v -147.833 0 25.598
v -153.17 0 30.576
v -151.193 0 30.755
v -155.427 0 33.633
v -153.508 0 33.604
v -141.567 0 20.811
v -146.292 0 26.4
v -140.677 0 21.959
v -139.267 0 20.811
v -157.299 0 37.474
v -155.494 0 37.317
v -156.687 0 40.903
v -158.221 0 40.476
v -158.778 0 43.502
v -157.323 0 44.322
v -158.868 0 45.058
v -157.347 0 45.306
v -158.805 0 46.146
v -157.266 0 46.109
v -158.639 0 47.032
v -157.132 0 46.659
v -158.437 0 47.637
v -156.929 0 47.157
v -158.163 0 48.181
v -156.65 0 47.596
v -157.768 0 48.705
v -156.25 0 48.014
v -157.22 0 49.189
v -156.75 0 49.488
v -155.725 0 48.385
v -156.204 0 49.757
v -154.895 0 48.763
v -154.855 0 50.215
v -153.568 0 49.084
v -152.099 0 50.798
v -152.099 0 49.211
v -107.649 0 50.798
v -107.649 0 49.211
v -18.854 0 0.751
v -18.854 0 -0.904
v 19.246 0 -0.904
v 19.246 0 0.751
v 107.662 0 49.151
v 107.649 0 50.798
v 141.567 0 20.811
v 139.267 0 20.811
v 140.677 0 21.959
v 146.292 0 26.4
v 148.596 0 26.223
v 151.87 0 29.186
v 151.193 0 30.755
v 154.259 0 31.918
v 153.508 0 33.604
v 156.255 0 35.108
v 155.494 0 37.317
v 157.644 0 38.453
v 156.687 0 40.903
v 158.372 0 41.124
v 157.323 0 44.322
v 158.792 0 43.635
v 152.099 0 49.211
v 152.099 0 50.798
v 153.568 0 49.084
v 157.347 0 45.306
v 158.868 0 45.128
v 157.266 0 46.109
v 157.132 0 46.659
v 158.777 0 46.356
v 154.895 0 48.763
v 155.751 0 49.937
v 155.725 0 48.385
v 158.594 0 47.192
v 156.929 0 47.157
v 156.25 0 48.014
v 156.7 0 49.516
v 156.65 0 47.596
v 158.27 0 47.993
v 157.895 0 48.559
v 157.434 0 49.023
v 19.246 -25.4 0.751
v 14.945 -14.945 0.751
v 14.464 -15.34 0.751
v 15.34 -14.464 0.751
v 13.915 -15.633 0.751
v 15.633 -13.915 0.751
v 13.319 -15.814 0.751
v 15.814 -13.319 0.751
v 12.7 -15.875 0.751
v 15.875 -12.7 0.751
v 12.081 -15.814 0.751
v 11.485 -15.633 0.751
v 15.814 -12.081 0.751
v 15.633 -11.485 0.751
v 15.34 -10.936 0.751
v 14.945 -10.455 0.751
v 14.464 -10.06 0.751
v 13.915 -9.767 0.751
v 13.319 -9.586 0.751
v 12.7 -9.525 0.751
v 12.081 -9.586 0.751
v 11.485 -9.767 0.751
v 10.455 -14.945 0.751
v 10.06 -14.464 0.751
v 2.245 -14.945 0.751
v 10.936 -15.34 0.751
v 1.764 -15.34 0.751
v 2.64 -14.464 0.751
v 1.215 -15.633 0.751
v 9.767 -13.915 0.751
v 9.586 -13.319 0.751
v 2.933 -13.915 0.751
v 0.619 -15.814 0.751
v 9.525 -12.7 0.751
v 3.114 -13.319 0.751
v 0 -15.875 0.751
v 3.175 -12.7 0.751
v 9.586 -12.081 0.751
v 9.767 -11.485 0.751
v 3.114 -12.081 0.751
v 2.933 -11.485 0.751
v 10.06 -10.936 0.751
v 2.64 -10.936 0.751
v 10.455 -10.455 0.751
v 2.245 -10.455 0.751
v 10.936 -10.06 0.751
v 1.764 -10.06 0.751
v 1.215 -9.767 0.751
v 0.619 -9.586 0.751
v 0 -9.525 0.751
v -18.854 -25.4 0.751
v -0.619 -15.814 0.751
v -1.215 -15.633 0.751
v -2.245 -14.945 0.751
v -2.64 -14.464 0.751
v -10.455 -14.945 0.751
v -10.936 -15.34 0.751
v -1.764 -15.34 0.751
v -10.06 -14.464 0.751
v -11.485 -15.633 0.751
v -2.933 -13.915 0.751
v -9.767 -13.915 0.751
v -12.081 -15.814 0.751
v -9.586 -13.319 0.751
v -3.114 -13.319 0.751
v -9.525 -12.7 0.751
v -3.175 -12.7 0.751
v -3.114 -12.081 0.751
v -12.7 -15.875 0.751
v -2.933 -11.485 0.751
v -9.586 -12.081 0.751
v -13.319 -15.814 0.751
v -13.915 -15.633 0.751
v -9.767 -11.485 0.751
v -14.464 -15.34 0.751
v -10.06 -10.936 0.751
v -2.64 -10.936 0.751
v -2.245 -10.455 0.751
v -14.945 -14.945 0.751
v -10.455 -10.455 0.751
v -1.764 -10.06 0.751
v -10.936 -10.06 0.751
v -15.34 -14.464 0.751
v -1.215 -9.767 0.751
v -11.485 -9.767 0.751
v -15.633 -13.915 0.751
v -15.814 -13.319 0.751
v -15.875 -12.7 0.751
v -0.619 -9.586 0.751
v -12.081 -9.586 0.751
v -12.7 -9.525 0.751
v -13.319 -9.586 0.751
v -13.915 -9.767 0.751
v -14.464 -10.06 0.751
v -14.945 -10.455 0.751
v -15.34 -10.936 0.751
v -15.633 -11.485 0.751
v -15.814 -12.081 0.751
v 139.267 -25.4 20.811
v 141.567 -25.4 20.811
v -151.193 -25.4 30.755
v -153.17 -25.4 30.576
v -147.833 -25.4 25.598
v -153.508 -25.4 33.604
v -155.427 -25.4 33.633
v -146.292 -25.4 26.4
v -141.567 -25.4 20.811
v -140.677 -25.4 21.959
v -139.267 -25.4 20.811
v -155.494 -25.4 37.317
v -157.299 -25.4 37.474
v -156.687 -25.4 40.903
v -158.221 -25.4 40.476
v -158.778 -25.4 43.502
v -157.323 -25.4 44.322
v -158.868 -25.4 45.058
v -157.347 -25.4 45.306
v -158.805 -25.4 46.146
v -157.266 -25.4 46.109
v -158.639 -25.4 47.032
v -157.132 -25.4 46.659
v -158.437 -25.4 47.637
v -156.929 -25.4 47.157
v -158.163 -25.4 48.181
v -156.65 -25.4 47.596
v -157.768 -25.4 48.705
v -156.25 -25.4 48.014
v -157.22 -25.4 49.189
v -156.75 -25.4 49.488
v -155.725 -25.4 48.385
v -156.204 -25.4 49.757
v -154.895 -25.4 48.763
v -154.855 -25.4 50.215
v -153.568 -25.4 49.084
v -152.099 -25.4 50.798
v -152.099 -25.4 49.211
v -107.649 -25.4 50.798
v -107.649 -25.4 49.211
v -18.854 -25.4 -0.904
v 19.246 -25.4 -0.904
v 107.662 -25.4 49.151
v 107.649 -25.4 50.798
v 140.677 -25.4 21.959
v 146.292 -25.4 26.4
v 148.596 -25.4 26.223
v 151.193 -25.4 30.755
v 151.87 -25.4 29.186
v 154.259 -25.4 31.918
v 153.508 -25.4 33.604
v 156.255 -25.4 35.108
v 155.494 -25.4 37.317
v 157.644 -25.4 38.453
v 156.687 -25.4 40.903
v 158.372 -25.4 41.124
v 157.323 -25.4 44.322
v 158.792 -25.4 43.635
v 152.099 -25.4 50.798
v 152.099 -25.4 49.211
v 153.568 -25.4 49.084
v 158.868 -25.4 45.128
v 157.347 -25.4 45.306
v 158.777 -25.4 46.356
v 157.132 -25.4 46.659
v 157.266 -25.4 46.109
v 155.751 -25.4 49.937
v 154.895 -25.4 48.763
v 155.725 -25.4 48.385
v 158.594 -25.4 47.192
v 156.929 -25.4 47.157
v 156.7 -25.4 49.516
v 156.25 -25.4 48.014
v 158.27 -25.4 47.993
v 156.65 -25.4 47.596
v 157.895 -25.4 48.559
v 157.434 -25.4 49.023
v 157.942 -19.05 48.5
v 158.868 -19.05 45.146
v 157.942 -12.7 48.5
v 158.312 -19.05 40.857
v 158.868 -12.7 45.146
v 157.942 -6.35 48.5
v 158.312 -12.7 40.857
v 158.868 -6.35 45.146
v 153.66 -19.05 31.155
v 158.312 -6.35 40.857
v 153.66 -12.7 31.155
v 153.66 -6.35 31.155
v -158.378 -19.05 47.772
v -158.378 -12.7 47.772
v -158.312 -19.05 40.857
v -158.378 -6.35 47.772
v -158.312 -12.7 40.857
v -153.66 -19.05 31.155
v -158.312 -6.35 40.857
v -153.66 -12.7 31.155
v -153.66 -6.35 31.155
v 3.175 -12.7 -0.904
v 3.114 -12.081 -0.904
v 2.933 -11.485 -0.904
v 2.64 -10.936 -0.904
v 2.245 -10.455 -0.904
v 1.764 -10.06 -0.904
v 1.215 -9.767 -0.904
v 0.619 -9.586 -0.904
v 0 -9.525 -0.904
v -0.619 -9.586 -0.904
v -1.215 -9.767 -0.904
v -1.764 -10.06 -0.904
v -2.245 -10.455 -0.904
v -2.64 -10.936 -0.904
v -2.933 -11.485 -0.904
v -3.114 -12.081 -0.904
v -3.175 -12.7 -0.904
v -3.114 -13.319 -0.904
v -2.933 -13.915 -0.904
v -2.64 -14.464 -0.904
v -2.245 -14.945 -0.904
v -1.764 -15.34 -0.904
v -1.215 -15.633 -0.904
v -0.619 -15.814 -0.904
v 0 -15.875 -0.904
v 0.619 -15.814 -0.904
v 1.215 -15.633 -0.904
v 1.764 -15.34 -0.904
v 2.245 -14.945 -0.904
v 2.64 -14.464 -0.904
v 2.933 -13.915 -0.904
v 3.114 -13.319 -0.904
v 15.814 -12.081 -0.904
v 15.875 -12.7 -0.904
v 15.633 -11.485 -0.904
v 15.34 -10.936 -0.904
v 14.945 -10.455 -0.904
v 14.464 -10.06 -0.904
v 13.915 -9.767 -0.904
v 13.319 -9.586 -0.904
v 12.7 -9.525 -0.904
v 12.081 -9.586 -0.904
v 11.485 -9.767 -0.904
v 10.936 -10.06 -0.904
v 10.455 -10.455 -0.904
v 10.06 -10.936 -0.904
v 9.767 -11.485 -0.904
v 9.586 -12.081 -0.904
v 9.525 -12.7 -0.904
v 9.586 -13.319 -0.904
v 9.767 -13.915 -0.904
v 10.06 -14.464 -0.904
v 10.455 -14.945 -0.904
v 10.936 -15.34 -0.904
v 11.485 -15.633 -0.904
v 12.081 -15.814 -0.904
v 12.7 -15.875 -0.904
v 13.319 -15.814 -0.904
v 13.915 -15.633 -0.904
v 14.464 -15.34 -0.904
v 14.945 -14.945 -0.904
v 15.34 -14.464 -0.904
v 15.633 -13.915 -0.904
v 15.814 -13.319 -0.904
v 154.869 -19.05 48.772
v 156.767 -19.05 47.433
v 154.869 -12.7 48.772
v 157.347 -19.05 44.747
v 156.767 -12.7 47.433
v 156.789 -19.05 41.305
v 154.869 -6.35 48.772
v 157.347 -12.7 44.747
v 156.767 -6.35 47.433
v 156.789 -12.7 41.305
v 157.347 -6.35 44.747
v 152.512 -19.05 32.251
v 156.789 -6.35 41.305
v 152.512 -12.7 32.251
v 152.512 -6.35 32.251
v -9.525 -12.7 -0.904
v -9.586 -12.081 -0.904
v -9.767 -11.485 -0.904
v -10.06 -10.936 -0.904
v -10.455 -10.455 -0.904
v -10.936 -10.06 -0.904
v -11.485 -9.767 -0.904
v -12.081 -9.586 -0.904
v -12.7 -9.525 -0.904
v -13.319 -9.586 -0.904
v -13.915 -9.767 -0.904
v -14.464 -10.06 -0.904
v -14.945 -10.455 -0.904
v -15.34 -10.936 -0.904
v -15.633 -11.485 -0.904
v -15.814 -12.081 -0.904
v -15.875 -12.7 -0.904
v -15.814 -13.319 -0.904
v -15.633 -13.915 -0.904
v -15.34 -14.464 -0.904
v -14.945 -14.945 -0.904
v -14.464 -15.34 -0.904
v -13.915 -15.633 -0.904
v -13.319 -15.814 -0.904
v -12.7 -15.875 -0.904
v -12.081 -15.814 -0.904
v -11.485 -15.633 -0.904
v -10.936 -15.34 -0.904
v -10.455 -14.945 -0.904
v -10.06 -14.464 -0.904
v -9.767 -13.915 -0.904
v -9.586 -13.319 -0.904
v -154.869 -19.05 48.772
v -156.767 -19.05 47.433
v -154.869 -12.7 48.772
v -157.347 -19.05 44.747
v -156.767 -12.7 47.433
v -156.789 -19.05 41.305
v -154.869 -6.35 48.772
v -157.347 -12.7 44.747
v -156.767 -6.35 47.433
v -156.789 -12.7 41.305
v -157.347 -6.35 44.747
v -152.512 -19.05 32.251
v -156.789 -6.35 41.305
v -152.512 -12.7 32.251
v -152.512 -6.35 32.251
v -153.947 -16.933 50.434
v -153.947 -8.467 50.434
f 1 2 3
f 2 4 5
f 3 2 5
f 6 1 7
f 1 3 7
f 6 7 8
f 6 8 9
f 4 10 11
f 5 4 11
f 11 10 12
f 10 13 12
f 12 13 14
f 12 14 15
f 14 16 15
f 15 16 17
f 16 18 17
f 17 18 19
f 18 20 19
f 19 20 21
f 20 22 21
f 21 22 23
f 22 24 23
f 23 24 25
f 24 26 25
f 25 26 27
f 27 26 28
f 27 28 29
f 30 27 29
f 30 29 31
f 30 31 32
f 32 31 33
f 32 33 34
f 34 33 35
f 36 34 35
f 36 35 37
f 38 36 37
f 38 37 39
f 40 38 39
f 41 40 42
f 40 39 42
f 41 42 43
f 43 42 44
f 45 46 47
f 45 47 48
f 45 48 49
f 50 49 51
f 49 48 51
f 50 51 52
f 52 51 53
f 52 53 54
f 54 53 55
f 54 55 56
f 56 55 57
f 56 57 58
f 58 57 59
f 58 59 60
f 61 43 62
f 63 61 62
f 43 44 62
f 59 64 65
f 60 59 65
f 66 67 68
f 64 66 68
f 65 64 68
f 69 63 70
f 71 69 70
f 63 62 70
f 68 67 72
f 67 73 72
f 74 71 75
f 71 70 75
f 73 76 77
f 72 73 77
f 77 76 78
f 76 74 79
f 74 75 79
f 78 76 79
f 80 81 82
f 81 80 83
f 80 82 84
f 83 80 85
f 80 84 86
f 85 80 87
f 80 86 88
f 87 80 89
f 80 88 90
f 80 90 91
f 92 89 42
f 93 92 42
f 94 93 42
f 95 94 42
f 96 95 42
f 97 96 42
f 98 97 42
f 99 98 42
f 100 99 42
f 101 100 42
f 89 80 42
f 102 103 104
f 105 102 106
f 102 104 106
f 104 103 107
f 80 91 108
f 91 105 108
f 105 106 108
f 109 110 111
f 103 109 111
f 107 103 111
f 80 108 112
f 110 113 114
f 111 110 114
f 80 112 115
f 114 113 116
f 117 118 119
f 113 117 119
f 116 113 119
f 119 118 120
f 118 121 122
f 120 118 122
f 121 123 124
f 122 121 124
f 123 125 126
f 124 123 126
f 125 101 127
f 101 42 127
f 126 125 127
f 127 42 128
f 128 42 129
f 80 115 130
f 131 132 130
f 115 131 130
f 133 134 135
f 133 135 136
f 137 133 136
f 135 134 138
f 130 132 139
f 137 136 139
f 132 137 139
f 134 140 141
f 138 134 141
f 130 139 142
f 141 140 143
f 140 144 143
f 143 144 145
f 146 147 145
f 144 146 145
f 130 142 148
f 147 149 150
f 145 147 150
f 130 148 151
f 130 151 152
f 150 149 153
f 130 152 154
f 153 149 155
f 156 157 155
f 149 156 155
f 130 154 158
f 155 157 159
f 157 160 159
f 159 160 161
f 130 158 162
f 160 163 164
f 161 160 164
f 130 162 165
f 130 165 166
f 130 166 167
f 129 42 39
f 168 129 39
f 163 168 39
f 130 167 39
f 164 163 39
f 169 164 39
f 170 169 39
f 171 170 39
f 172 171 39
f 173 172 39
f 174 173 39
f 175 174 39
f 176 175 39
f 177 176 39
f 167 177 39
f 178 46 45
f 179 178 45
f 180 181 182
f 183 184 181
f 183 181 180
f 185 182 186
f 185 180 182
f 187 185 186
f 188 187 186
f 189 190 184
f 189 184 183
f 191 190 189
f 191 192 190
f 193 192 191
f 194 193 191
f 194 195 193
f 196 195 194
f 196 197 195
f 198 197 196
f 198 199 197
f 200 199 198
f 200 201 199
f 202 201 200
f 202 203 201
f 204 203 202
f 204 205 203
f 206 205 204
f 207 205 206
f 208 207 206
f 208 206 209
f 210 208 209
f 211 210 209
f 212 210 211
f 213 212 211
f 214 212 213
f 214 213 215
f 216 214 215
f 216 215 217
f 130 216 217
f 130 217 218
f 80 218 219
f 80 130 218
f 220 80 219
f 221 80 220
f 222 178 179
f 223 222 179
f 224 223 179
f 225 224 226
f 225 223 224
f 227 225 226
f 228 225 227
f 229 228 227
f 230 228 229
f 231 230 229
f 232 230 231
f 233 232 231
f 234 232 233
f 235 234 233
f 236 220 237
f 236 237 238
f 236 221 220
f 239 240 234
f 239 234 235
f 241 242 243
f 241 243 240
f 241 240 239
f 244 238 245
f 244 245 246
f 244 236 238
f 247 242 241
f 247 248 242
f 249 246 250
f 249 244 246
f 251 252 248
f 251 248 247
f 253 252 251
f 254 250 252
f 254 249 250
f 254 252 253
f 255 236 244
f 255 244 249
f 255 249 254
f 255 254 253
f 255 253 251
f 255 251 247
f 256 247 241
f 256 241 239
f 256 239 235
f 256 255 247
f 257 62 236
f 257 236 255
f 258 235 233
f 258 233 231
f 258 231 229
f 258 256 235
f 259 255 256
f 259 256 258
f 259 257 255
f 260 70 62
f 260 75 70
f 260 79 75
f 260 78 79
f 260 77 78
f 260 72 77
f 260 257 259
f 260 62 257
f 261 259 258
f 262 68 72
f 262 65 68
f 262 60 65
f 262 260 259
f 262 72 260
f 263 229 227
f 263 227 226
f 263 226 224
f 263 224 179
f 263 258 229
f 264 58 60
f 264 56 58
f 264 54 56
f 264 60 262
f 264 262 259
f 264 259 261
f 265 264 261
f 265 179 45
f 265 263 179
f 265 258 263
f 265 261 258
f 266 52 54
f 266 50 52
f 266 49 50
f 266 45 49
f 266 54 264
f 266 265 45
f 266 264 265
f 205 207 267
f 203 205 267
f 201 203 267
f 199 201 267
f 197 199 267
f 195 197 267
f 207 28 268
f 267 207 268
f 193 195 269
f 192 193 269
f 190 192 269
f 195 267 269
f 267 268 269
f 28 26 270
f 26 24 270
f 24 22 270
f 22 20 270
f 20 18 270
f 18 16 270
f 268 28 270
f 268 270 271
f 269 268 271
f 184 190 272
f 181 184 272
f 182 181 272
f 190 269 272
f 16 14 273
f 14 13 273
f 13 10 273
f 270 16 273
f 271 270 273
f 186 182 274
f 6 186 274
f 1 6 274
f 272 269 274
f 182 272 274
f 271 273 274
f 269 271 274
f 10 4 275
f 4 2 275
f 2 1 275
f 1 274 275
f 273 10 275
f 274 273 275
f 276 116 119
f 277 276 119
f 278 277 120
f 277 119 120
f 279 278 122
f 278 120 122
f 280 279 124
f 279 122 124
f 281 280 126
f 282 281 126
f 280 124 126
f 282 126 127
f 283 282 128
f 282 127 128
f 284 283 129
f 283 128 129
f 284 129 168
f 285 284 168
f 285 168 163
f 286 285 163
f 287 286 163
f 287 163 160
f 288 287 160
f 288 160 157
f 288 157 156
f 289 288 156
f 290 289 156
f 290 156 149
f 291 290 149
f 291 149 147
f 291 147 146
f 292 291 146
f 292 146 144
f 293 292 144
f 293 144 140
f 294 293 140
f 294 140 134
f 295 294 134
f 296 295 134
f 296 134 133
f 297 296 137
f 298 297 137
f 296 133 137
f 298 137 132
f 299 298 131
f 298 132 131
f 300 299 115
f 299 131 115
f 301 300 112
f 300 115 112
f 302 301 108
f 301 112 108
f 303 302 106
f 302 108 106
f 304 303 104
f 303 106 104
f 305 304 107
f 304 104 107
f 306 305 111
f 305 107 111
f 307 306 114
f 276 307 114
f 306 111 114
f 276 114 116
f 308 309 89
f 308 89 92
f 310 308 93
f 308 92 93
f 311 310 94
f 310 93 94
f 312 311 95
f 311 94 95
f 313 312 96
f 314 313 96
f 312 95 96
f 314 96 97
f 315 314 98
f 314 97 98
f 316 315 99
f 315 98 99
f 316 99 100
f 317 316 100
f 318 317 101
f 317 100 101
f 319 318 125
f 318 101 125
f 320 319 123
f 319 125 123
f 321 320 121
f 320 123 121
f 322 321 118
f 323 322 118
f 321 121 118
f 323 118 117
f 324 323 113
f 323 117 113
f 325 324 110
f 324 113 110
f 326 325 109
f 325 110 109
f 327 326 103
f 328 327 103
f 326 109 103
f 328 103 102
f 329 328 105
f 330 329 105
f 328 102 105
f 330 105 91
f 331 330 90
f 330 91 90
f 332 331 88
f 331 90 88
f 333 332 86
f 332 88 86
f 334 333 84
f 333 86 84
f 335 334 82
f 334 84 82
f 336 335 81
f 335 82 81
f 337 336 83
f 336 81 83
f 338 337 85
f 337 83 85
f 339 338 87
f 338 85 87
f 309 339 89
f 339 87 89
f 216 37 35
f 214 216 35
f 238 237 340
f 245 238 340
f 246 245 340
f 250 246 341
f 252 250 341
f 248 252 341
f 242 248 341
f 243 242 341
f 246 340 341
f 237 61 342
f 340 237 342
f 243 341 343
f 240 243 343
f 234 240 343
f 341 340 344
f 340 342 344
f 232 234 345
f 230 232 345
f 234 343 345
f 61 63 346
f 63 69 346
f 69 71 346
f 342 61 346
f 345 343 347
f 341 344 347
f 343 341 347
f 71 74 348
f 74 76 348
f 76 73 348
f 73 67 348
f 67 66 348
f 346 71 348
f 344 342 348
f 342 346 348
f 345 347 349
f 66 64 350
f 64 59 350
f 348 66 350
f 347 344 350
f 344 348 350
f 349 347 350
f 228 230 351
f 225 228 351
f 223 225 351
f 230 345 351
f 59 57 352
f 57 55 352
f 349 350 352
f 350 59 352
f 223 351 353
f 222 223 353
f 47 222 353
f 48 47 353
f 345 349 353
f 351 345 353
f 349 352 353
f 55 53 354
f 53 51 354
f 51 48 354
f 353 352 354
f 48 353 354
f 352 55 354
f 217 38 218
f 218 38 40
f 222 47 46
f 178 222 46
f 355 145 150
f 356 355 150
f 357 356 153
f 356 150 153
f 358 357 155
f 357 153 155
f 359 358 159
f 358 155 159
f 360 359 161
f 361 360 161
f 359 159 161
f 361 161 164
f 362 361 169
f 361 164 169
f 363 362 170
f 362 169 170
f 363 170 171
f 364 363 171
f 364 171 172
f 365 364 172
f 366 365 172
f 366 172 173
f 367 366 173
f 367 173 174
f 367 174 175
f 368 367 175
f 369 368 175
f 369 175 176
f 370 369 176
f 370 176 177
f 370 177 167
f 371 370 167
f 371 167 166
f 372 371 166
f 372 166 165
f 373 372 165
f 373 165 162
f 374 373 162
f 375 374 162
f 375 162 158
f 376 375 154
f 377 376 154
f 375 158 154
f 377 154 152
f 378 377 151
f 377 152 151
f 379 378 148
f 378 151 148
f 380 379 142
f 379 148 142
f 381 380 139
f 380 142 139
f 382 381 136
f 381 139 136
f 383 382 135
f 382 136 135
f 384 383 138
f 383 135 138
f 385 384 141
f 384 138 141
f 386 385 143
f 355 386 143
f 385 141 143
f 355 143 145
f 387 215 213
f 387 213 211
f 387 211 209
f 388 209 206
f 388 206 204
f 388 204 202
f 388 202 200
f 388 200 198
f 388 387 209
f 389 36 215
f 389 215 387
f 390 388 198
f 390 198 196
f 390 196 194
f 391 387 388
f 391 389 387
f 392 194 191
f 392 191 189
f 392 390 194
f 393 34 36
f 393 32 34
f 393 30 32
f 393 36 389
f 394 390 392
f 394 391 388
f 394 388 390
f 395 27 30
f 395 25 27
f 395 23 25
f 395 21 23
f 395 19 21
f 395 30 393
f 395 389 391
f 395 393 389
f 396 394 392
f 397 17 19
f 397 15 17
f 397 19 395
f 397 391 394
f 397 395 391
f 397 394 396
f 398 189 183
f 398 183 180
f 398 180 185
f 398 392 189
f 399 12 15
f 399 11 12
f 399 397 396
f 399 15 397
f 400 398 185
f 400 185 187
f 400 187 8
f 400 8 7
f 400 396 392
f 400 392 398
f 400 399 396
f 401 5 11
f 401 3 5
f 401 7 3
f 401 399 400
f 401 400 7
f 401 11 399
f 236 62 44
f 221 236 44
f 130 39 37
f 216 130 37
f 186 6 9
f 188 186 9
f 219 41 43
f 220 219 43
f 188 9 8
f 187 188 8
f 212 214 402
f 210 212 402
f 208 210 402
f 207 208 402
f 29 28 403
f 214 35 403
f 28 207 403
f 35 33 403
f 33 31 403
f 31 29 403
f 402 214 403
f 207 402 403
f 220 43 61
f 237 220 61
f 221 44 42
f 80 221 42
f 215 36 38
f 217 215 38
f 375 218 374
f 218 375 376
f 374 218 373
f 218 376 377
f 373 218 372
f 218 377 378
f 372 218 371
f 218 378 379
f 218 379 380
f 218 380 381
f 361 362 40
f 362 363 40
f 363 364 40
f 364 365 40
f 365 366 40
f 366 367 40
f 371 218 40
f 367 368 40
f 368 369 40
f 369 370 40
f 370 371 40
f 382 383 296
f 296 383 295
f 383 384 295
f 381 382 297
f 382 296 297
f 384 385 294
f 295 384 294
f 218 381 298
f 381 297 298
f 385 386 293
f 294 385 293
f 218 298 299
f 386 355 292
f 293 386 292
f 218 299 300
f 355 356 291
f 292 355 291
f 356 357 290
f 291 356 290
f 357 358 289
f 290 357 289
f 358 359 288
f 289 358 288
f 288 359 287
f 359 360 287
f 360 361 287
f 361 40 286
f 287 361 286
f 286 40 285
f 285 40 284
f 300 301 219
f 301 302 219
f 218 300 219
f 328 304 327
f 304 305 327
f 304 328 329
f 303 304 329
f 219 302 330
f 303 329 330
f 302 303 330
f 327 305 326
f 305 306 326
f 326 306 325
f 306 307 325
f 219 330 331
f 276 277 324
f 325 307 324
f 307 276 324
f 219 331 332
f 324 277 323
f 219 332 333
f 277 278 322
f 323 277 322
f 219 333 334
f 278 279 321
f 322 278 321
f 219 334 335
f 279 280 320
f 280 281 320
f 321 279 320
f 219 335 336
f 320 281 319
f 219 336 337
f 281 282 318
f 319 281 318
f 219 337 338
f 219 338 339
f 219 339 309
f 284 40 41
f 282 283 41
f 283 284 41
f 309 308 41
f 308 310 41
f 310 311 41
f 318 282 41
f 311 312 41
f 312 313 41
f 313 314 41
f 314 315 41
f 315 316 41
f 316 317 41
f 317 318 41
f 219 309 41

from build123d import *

# Parameters (mm, degrees)
F1_DEPTH = 25.4
F2_R     = 3.175
F3_DEPTH = 12.7


with BuildPart() as f1:
    # F0 (on Front) → F1 (new body)
    with BuildSketch(Plane.XZ):
        with BuildLine():
            Line((-18.853932295, -0.9037953805), (19.246067705, -0.9037953805))
            Line((19.246067705, -0.9037953805), (107.6620070872, 49.150995825))
            Line((107.6620070872, 49.150995825), (152.0988404129, 49.2108775302))
            add(Edge.make_bspline(
                [(152.0988404129, 49.2108775302), (154.096448251, 49.1571351558), (157.9680726407, 48.1639388699), (156.9887382525, 40.7006012119), (153.2726748418, 31.1757846536), (145.095218186, 25.5552398746), (140.677466878, 21.9591195048)],
                knots=[0, 0, 0, 0, 0.1888423696, 0.3980048629, 0.6653840554, 1, 1, 1, 1], degree=3))
            Line((140.677466878, 21.9591195048), (139.2667979812, 20.8108124135))
            Line((139.2667979812, 20.8108124135), (141.5670902347, 20.8108124135))
            add(Edge.make_bspline(
                [(152.0988404129, 50.7983775302), (154.306296926, 50.3681641551), (159.476931415, 49.611890584), (158.6795920841, 40.1344696534), (154.4483157881, 30.2280053539), (146.0442095515, 24.1682370519), (141.5670902347, 20.8108124135)],
                knots=[0, 0, 0, 0, 0.1998048876, 0.4203700309, 0.6819181132, 1, 1, 1, 1], degree=3))
            Line((152.0988404129, 50.7983775302), (107.6488404129, 50.7983775302))
            Line((107.6488404129, 50.7983775302), (19.246067705, 0.7510403555))
            Line((19.246067705, 0.7510403555), (-18.853932295, 0.7510403555))
            Line((-18.853932295, 0.7510403555), (-107.6488404129, 50.7983775302))
            Line((-107.6488404129, 50.7983775302), (-152.0988404129, 50.7983775302))
            Line((-152.0988404129, 50.7983775302), (-152.0988404129, 49.2108775302))
            Line((-152.0988404129, 49.2108775302), (-107.6488404129, 49.2108775302))
            Line((-107.6488404129, 49.2108775302), (-18.853932295, -0.9037953805))
        make_face()
        with BuildLine():
            Line((-157.2197924683, 49.1892070903), (-152.0988404129, 49.2108775302))
            Line((-152.0988404129, 49.2108775302), (-152.0988404129, 50.7983775302))
            add(Edge.make_bspline(
                [(-152.0988404129, 50.7983775302), (-153.9225163002, 50.4429595395), (-155.9169454372, 50.1358301213), (-157.2197924683, 49.1892070903)],
                knots=[0, 0, 0, 0, 0.1650675125, 0.1650675125, 0.1650675125, 0.1650675125], degree=3))
        make_face()
        with BuildLine():
            add(Edge.make_bspline(
                [(-152.0988404129, 49.2108775302), (-154.096448251, 49.1571351558), (-157.9680726407, 48.1639388699), (-156.9887382525, 40.7006012119), (-153.2726748418, 31.1757846536), (-145.095218186, 25.5552398746), (-140.677466878, 21.9591195048)],
                knots=[0, 0, 0, 0, 0.1888423696, 0.3980048629, 0.6653840554, 1, 1, 1, 1], degree=3))
            Line((-152.0988404129, 49.2108775302), (-157.2197924683, 49.1892070903))
            add(Edge.make_bspline(
                [(-157.2197924683, 49.1892070903), (-157.4939680784, 48.9899964839), (-159.283924634, 47.3177525231), (-158.6795920841, 40.1344696534), (-154.4483157881, 30.2280053539), (-146.0442095515, 24.1682370519), (-141.5670902347, 20.8108124135)],
                knots=[0.1650675125, 0.1650675125, 0.1650675125, 0.1650675125, 0.1998048876, 0.4203700309, 0.6819181132, 1, 1, 1, 1], degree=3))
            Line((-141.5670902347, 20.8108124135), (-139.2667979812, 20.8108124135))
            Line((-139.2667979812, 20.8108124135), (-140.677466878, 21.9591195048))
        make_face()
    extrude(amount=F1_DEPTH)

    # F2 (on face) → F3 (cut, symmetric)
    with BuildSketch(Plane.XY.offset(0.7510403555)):
        with Locations((0, -12.7)):
            Circle(F2_R)
        with Locations((-12.7, -12.7)):
            Circle(F2_R)
        with Locations((12.7, -12.7)):
            Circle(F2_R)
    extrude(amount=F3_DEPTH, both=True, mode=Mode.SUBTRACT)


solid = f1.part
